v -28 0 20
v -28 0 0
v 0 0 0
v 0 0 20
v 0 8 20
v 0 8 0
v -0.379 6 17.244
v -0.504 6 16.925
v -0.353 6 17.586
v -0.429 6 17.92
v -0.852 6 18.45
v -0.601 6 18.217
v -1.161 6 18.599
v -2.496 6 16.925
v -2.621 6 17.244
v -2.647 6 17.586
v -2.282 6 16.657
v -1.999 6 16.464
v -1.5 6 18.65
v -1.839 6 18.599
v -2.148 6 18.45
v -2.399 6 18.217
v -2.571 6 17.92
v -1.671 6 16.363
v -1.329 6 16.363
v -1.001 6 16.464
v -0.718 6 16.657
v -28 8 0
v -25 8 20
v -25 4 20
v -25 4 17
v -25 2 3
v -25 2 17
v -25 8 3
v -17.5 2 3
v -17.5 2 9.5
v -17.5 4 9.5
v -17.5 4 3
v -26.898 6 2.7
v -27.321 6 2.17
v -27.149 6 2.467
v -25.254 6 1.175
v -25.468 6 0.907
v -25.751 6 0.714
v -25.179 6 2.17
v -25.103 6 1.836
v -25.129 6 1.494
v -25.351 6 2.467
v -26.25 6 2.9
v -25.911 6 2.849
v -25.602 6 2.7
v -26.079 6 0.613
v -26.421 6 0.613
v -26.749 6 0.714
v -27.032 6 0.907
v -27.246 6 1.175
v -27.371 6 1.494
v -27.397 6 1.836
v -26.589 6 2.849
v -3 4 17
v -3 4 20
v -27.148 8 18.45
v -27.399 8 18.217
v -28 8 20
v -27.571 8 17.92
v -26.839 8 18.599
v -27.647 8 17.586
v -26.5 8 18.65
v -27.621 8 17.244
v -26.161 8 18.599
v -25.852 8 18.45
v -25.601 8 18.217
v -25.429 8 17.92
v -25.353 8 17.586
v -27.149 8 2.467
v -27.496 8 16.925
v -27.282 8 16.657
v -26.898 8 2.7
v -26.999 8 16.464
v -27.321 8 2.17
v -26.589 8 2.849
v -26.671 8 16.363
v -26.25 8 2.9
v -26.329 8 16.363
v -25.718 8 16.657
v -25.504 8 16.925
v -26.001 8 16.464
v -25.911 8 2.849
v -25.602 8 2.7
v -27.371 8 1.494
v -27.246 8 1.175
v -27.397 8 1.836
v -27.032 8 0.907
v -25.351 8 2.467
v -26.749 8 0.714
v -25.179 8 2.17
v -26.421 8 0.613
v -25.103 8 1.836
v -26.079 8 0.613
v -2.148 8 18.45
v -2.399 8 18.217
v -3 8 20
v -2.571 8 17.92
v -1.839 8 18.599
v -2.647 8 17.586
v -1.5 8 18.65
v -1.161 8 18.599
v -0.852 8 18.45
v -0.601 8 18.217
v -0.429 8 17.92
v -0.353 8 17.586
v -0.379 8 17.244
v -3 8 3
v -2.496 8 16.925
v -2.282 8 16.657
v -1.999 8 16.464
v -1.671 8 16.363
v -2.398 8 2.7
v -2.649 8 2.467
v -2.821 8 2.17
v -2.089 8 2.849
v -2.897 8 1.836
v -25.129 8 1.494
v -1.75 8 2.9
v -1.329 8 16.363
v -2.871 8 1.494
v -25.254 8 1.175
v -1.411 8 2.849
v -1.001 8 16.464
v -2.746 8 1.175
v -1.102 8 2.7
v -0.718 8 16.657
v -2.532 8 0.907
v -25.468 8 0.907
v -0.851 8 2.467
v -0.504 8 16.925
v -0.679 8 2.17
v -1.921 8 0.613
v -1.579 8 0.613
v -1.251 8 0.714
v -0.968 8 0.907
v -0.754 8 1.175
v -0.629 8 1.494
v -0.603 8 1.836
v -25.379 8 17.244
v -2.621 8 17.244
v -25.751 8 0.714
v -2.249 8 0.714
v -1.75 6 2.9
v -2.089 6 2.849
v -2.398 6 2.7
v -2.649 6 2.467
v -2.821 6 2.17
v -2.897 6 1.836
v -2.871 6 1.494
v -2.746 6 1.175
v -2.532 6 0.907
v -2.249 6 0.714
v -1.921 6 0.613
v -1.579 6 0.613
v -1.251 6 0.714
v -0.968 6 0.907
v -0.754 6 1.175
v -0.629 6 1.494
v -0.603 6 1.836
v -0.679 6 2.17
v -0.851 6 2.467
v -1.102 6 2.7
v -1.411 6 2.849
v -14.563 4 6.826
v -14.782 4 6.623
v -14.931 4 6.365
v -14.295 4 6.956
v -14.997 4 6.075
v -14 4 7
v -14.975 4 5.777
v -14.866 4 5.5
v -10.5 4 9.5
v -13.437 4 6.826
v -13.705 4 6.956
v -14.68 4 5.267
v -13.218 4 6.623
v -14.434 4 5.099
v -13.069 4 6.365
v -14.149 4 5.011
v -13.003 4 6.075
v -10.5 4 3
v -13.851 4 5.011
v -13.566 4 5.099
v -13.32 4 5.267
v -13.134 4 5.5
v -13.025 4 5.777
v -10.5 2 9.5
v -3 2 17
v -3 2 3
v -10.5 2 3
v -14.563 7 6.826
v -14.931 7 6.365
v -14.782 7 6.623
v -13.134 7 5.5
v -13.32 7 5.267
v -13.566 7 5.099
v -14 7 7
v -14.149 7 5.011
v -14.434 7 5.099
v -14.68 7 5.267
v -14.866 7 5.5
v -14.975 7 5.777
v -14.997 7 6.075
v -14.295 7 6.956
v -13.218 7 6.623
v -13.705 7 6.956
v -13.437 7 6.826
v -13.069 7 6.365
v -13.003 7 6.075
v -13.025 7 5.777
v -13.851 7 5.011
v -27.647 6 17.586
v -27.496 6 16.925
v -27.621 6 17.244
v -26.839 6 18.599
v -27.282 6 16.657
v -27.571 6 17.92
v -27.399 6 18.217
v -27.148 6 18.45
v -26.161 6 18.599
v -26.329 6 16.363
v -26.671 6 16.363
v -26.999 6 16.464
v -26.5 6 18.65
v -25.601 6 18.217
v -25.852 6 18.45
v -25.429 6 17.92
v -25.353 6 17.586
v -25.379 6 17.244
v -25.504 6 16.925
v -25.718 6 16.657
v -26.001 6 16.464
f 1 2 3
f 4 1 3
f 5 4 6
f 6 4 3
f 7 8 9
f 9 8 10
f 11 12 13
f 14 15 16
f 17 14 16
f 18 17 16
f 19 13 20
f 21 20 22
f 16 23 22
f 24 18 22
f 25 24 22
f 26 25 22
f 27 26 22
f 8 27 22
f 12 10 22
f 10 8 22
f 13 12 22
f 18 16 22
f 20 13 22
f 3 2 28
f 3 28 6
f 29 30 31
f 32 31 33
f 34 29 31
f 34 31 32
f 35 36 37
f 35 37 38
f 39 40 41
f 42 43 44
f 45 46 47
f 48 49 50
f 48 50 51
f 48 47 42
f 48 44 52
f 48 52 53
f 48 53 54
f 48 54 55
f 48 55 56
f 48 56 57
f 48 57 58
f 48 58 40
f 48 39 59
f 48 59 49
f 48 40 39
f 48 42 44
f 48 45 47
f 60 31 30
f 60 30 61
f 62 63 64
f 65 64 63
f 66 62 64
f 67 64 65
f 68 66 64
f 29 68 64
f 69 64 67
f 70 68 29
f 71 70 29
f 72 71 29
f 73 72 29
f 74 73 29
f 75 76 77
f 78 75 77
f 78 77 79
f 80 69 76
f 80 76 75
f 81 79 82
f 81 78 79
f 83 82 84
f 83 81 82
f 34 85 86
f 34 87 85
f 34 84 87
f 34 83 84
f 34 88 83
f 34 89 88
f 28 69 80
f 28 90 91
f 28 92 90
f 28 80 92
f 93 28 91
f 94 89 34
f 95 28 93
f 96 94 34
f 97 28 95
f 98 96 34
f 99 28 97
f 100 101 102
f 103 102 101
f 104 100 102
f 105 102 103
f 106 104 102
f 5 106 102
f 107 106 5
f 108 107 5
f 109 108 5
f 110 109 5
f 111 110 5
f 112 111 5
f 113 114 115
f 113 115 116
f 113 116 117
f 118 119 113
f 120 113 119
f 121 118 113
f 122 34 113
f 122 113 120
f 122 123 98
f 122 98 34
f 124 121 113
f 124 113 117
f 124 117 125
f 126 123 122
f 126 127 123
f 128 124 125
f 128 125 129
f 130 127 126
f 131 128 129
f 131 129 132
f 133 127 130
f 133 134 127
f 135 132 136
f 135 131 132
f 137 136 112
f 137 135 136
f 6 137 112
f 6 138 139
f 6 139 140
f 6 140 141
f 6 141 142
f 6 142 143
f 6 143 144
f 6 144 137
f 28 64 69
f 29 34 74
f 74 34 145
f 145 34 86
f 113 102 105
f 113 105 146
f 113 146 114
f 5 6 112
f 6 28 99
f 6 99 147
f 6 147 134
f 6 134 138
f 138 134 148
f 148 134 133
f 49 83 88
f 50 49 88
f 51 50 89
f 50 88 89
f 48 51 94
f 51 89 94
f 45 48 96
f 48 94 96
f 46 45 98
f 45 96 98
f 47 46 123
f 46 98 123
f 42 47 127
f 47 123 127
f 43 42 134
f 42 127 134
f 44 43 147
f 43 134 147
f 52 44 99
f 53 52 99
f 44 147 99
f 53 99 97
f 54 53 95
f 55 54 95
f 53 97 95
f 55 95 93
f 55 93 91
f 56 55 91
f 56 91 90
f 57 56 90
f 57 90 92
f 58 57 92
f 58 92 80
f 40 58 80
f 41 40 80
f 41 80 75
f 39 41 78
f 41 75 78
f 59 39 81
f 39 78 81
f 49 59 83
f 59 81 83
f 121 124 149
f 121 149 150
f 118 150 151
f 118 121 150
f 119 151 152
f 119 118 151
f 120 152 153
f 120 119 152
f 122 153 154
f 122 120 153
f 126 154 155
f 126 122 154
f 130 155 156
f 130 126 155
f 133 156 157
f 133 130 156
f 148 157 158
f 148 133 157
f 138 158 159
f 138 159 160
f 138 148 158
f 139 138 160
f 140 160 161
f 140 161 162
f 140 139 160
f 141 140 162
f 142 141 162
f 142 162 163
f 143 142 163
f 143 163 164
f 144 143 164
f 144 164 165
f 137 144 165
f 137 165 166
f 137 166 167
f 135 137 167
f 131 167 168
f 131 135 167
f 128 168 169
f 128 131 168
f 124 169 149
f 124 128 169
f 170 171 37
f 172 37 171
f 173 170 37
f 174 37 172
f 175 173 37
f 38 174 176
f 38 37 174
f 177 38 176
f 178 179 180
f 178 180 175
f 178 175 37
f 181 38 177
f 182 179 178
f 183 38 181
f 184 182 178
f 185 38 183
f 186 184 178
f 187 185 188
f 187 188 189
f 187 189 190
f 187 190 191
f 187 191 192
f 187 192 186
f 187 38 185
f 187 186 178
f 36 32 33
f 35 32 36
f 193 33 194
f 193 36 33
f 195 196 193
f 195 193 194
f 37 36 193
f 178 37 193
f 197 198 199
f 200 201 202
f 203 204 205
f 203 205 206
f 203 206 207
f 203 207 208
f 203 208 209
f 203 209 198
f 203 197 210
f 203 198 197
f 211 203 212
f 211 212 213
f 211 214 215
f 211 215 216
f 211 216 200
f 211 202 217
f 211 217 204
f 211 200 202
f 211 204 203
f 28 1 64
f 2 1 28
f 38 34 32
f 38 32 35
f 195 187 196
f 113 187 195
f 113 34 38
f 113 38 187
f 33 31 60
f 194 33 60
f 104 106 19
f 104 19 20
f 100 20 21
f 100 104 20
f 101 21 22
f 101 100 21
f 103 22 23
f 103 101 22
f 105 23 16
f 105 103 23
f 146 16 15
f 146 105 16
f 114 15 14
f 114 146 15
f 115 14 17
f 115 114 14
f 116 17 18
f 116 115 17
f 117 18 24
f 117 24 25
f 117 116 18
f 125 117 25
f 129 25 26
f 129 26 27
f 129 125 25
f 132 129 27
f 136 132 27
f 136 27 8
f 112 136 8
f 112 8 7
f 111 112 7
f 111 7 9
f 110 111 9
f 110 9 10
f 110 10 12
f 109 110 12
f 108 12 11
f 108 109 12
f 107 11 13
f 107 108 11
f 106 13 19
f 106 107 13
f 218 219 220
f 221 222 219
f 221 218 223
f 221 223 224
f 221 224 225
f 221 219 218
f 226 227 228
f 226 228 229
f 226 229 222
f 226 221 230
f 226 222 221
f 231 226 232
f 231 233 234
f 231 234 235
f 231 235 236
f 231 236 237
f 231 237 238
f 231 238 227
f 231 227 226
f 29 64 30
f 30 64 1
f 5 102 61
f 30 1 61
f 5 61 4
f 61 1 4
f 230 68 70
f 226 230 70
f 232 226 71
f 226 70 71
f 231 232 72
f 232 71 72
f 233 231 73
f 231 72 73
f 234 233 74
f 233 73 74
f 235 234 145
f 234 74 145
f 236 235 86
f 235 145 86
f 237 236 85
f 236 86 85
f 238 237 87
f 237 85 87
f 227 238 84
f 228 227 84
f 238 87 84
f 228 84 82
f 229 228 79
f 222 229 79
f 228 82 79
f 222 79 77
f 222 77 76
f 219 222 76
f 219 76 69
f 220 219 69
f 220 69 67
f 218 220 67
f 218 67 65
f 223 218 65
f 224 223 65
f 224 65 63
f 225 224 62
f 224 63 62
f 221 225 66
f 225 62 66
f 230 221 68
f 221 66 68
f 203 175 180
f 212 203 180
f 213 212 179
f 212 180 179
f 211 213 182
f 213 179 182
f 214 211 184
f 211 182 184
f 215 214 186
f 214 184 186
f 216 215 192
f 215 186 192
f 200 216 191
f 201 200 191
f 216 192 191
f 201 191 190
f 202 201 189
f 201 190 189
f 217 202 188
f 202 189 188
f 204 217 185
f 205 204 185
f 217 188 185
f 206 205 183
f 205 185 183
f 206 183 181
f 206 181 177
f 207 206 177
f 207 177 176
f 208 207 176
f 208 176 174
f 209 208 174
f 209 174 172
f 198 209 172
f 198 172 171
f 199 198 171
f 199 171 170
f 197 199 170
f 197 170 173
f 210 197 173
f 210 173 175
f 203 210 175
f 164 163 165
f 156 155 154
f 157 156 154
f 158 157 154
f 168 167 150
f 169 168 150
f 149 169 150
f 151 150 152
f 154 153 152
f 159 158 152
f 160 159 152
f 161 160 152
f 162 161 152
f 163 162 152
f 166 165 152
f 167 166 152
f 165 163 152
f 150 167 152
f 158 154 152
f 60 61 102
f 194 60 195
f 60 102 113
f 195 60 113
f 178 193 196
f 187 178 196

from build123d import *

# Parameters (mm, degrees)
ESQUISSE3_W             = 28
ESQUISSE3_H             = 20
BOSS_EXTRU_1_DEPTH      = 8
ESQUISSE4_W             = 22
ESQUISSE4_H             = 14
ENL_V_MAT_EXTRU_1_DEPTH = 6
ESQUISSE5_W             = 22
ESQUISSE5_H             = 3
ENL_V_MAT_EXTRU_2_DEPTH = 4
ESQUISSE7_R             = 1
BOSS_EXTRU_2_DEPTH      = 5
ESQUISSE9_R             = 1.15
ENL_V_MAT_EXTRU_3_DEPTH = 2
ESQUISSE11_R            = 1.15
ENL_V_MAT_EXTRU_4_DEPTH = 2
ESQUISSE12_W            = 7
ESQUISSE12_H            = 6.5
BOSS_EXTRU_3_DEPTH      = 2


with BuildPart() as part:
    # Esquisse3 → Boss.-Extru.1 (new body)
    with BuildSketch(Plane(origin=(0, 0, 0), x_dir=(1, 0, 0), z_dir=(0, 1, 0))):
        with Locations((-14, -10)):
            Rectangle(ESQUISSE3_W, ESQUISSE3_H)
    extrude(amount=BOSS_EXTRU_1_DEPTH)

    # Esquisse4 → Enlèv. mat.-Extru.1 (cut)
    with BuildSketch(Plane(origin=(0, 8, 0), x_dir=(1, 0, 0), z_dir=(0, 1, 0))):
        with Locations((-14, -10)):
            Rectangle(ESQUISSE4_W, ESQUISSE4_H)
    extrude(amount=-ENL_V_MAT_EXTRU_1_DEPTH, mode=Mode.SUBTRACT)

    # Esquisse5 → Enlèv. mat.-Extru.2 (cut)
    with BuildSketch(Plane(origin=(0, 8, 0), x_dir=(1, 0, 0), z_dir=(0, 1, 0))):
        with Locations((-14, -18.5)):
            Rectangle(ESQUISSE5_W, ESQUISSE5_H)
    extrude(amount=-ENL_V_MAT_EXTRU_2_DEPTH, mode=Mode.SUBTRACT)

    # Esquisse7 → Boss.-Extru.2 (add)
    with BuildSketch(Plane(origin=(0, 2, 0), x_dir=(1, 0, 0), z_dir=(0, 1, 0))):
        with Locations(Location((-14, -6, 0), (0, 0, 270))):
            Circle(ESQUISSE7_R)
    extrude(amount=BOSS_EXTRU_2_DEPTH)

    # Esquisse9 → Enlèv. mat.-Extru.3 (cut)
    with BuildSketch(Plane(origin=(0, 8, 0), x_dir=(1, 0, 0), z_dir=(0, 1, 0))):
        with Locations(Location((-26.25, -1.75, 0), (0, 0, 270))):
            Circle(ESQUISSE9_R)
    enl_v_mat_extru_3 = extrude(amount=-ENL_V_MAT_EXTRU_3_DEPTH, mode=Mode.SUBTRACT)

    # Symétrie1: Enlèv. mat.-Extru.3 across plane
    add(enl_v_mat_extru_3.mirror(Plane.ZY.offset(14)), mode=Mode.SUBTRACT)

    # Esquisse11 → Enlèv. mat.-Extru.4 (cut)
    with BuildSketch(Plane(origin=(0, 8, 0), x_dir=(1, 0, 0), z_dir=(0, 1, 0))):
        with Locations(Location((-26.5, -17.5, 0), (0, 0, 270))):
            Circle(ESQUISSE11_R)
    enl_v_mat_extru_4 = extrude(amount=-ENL_V_MAT_EXTRU_4_DEPTH, mode=Mode.SUBTRACT)

    # Symétrie2: Enlèv. mat.-Extru.4 across plane
    add(enl_v_mat_extru_4.mirror(Plane.ZY.offset(14)), mode=Mode.SUBTRACT)

    # Esquisse12 → Boss.-Extru.3 (add)
    with BuildSketch(Plane(origin=(0, 2, 0), x_dir=(1, 0, 0), z_dir=(0, 1, 0))):
        with Locations((-14, -6.25)):
            Rectangle(ESQUISSE12_W, ESQUISSE12_H)
    extrude(amount=BOSS_EXTRU_3_DEPTH)


solid = part.part
